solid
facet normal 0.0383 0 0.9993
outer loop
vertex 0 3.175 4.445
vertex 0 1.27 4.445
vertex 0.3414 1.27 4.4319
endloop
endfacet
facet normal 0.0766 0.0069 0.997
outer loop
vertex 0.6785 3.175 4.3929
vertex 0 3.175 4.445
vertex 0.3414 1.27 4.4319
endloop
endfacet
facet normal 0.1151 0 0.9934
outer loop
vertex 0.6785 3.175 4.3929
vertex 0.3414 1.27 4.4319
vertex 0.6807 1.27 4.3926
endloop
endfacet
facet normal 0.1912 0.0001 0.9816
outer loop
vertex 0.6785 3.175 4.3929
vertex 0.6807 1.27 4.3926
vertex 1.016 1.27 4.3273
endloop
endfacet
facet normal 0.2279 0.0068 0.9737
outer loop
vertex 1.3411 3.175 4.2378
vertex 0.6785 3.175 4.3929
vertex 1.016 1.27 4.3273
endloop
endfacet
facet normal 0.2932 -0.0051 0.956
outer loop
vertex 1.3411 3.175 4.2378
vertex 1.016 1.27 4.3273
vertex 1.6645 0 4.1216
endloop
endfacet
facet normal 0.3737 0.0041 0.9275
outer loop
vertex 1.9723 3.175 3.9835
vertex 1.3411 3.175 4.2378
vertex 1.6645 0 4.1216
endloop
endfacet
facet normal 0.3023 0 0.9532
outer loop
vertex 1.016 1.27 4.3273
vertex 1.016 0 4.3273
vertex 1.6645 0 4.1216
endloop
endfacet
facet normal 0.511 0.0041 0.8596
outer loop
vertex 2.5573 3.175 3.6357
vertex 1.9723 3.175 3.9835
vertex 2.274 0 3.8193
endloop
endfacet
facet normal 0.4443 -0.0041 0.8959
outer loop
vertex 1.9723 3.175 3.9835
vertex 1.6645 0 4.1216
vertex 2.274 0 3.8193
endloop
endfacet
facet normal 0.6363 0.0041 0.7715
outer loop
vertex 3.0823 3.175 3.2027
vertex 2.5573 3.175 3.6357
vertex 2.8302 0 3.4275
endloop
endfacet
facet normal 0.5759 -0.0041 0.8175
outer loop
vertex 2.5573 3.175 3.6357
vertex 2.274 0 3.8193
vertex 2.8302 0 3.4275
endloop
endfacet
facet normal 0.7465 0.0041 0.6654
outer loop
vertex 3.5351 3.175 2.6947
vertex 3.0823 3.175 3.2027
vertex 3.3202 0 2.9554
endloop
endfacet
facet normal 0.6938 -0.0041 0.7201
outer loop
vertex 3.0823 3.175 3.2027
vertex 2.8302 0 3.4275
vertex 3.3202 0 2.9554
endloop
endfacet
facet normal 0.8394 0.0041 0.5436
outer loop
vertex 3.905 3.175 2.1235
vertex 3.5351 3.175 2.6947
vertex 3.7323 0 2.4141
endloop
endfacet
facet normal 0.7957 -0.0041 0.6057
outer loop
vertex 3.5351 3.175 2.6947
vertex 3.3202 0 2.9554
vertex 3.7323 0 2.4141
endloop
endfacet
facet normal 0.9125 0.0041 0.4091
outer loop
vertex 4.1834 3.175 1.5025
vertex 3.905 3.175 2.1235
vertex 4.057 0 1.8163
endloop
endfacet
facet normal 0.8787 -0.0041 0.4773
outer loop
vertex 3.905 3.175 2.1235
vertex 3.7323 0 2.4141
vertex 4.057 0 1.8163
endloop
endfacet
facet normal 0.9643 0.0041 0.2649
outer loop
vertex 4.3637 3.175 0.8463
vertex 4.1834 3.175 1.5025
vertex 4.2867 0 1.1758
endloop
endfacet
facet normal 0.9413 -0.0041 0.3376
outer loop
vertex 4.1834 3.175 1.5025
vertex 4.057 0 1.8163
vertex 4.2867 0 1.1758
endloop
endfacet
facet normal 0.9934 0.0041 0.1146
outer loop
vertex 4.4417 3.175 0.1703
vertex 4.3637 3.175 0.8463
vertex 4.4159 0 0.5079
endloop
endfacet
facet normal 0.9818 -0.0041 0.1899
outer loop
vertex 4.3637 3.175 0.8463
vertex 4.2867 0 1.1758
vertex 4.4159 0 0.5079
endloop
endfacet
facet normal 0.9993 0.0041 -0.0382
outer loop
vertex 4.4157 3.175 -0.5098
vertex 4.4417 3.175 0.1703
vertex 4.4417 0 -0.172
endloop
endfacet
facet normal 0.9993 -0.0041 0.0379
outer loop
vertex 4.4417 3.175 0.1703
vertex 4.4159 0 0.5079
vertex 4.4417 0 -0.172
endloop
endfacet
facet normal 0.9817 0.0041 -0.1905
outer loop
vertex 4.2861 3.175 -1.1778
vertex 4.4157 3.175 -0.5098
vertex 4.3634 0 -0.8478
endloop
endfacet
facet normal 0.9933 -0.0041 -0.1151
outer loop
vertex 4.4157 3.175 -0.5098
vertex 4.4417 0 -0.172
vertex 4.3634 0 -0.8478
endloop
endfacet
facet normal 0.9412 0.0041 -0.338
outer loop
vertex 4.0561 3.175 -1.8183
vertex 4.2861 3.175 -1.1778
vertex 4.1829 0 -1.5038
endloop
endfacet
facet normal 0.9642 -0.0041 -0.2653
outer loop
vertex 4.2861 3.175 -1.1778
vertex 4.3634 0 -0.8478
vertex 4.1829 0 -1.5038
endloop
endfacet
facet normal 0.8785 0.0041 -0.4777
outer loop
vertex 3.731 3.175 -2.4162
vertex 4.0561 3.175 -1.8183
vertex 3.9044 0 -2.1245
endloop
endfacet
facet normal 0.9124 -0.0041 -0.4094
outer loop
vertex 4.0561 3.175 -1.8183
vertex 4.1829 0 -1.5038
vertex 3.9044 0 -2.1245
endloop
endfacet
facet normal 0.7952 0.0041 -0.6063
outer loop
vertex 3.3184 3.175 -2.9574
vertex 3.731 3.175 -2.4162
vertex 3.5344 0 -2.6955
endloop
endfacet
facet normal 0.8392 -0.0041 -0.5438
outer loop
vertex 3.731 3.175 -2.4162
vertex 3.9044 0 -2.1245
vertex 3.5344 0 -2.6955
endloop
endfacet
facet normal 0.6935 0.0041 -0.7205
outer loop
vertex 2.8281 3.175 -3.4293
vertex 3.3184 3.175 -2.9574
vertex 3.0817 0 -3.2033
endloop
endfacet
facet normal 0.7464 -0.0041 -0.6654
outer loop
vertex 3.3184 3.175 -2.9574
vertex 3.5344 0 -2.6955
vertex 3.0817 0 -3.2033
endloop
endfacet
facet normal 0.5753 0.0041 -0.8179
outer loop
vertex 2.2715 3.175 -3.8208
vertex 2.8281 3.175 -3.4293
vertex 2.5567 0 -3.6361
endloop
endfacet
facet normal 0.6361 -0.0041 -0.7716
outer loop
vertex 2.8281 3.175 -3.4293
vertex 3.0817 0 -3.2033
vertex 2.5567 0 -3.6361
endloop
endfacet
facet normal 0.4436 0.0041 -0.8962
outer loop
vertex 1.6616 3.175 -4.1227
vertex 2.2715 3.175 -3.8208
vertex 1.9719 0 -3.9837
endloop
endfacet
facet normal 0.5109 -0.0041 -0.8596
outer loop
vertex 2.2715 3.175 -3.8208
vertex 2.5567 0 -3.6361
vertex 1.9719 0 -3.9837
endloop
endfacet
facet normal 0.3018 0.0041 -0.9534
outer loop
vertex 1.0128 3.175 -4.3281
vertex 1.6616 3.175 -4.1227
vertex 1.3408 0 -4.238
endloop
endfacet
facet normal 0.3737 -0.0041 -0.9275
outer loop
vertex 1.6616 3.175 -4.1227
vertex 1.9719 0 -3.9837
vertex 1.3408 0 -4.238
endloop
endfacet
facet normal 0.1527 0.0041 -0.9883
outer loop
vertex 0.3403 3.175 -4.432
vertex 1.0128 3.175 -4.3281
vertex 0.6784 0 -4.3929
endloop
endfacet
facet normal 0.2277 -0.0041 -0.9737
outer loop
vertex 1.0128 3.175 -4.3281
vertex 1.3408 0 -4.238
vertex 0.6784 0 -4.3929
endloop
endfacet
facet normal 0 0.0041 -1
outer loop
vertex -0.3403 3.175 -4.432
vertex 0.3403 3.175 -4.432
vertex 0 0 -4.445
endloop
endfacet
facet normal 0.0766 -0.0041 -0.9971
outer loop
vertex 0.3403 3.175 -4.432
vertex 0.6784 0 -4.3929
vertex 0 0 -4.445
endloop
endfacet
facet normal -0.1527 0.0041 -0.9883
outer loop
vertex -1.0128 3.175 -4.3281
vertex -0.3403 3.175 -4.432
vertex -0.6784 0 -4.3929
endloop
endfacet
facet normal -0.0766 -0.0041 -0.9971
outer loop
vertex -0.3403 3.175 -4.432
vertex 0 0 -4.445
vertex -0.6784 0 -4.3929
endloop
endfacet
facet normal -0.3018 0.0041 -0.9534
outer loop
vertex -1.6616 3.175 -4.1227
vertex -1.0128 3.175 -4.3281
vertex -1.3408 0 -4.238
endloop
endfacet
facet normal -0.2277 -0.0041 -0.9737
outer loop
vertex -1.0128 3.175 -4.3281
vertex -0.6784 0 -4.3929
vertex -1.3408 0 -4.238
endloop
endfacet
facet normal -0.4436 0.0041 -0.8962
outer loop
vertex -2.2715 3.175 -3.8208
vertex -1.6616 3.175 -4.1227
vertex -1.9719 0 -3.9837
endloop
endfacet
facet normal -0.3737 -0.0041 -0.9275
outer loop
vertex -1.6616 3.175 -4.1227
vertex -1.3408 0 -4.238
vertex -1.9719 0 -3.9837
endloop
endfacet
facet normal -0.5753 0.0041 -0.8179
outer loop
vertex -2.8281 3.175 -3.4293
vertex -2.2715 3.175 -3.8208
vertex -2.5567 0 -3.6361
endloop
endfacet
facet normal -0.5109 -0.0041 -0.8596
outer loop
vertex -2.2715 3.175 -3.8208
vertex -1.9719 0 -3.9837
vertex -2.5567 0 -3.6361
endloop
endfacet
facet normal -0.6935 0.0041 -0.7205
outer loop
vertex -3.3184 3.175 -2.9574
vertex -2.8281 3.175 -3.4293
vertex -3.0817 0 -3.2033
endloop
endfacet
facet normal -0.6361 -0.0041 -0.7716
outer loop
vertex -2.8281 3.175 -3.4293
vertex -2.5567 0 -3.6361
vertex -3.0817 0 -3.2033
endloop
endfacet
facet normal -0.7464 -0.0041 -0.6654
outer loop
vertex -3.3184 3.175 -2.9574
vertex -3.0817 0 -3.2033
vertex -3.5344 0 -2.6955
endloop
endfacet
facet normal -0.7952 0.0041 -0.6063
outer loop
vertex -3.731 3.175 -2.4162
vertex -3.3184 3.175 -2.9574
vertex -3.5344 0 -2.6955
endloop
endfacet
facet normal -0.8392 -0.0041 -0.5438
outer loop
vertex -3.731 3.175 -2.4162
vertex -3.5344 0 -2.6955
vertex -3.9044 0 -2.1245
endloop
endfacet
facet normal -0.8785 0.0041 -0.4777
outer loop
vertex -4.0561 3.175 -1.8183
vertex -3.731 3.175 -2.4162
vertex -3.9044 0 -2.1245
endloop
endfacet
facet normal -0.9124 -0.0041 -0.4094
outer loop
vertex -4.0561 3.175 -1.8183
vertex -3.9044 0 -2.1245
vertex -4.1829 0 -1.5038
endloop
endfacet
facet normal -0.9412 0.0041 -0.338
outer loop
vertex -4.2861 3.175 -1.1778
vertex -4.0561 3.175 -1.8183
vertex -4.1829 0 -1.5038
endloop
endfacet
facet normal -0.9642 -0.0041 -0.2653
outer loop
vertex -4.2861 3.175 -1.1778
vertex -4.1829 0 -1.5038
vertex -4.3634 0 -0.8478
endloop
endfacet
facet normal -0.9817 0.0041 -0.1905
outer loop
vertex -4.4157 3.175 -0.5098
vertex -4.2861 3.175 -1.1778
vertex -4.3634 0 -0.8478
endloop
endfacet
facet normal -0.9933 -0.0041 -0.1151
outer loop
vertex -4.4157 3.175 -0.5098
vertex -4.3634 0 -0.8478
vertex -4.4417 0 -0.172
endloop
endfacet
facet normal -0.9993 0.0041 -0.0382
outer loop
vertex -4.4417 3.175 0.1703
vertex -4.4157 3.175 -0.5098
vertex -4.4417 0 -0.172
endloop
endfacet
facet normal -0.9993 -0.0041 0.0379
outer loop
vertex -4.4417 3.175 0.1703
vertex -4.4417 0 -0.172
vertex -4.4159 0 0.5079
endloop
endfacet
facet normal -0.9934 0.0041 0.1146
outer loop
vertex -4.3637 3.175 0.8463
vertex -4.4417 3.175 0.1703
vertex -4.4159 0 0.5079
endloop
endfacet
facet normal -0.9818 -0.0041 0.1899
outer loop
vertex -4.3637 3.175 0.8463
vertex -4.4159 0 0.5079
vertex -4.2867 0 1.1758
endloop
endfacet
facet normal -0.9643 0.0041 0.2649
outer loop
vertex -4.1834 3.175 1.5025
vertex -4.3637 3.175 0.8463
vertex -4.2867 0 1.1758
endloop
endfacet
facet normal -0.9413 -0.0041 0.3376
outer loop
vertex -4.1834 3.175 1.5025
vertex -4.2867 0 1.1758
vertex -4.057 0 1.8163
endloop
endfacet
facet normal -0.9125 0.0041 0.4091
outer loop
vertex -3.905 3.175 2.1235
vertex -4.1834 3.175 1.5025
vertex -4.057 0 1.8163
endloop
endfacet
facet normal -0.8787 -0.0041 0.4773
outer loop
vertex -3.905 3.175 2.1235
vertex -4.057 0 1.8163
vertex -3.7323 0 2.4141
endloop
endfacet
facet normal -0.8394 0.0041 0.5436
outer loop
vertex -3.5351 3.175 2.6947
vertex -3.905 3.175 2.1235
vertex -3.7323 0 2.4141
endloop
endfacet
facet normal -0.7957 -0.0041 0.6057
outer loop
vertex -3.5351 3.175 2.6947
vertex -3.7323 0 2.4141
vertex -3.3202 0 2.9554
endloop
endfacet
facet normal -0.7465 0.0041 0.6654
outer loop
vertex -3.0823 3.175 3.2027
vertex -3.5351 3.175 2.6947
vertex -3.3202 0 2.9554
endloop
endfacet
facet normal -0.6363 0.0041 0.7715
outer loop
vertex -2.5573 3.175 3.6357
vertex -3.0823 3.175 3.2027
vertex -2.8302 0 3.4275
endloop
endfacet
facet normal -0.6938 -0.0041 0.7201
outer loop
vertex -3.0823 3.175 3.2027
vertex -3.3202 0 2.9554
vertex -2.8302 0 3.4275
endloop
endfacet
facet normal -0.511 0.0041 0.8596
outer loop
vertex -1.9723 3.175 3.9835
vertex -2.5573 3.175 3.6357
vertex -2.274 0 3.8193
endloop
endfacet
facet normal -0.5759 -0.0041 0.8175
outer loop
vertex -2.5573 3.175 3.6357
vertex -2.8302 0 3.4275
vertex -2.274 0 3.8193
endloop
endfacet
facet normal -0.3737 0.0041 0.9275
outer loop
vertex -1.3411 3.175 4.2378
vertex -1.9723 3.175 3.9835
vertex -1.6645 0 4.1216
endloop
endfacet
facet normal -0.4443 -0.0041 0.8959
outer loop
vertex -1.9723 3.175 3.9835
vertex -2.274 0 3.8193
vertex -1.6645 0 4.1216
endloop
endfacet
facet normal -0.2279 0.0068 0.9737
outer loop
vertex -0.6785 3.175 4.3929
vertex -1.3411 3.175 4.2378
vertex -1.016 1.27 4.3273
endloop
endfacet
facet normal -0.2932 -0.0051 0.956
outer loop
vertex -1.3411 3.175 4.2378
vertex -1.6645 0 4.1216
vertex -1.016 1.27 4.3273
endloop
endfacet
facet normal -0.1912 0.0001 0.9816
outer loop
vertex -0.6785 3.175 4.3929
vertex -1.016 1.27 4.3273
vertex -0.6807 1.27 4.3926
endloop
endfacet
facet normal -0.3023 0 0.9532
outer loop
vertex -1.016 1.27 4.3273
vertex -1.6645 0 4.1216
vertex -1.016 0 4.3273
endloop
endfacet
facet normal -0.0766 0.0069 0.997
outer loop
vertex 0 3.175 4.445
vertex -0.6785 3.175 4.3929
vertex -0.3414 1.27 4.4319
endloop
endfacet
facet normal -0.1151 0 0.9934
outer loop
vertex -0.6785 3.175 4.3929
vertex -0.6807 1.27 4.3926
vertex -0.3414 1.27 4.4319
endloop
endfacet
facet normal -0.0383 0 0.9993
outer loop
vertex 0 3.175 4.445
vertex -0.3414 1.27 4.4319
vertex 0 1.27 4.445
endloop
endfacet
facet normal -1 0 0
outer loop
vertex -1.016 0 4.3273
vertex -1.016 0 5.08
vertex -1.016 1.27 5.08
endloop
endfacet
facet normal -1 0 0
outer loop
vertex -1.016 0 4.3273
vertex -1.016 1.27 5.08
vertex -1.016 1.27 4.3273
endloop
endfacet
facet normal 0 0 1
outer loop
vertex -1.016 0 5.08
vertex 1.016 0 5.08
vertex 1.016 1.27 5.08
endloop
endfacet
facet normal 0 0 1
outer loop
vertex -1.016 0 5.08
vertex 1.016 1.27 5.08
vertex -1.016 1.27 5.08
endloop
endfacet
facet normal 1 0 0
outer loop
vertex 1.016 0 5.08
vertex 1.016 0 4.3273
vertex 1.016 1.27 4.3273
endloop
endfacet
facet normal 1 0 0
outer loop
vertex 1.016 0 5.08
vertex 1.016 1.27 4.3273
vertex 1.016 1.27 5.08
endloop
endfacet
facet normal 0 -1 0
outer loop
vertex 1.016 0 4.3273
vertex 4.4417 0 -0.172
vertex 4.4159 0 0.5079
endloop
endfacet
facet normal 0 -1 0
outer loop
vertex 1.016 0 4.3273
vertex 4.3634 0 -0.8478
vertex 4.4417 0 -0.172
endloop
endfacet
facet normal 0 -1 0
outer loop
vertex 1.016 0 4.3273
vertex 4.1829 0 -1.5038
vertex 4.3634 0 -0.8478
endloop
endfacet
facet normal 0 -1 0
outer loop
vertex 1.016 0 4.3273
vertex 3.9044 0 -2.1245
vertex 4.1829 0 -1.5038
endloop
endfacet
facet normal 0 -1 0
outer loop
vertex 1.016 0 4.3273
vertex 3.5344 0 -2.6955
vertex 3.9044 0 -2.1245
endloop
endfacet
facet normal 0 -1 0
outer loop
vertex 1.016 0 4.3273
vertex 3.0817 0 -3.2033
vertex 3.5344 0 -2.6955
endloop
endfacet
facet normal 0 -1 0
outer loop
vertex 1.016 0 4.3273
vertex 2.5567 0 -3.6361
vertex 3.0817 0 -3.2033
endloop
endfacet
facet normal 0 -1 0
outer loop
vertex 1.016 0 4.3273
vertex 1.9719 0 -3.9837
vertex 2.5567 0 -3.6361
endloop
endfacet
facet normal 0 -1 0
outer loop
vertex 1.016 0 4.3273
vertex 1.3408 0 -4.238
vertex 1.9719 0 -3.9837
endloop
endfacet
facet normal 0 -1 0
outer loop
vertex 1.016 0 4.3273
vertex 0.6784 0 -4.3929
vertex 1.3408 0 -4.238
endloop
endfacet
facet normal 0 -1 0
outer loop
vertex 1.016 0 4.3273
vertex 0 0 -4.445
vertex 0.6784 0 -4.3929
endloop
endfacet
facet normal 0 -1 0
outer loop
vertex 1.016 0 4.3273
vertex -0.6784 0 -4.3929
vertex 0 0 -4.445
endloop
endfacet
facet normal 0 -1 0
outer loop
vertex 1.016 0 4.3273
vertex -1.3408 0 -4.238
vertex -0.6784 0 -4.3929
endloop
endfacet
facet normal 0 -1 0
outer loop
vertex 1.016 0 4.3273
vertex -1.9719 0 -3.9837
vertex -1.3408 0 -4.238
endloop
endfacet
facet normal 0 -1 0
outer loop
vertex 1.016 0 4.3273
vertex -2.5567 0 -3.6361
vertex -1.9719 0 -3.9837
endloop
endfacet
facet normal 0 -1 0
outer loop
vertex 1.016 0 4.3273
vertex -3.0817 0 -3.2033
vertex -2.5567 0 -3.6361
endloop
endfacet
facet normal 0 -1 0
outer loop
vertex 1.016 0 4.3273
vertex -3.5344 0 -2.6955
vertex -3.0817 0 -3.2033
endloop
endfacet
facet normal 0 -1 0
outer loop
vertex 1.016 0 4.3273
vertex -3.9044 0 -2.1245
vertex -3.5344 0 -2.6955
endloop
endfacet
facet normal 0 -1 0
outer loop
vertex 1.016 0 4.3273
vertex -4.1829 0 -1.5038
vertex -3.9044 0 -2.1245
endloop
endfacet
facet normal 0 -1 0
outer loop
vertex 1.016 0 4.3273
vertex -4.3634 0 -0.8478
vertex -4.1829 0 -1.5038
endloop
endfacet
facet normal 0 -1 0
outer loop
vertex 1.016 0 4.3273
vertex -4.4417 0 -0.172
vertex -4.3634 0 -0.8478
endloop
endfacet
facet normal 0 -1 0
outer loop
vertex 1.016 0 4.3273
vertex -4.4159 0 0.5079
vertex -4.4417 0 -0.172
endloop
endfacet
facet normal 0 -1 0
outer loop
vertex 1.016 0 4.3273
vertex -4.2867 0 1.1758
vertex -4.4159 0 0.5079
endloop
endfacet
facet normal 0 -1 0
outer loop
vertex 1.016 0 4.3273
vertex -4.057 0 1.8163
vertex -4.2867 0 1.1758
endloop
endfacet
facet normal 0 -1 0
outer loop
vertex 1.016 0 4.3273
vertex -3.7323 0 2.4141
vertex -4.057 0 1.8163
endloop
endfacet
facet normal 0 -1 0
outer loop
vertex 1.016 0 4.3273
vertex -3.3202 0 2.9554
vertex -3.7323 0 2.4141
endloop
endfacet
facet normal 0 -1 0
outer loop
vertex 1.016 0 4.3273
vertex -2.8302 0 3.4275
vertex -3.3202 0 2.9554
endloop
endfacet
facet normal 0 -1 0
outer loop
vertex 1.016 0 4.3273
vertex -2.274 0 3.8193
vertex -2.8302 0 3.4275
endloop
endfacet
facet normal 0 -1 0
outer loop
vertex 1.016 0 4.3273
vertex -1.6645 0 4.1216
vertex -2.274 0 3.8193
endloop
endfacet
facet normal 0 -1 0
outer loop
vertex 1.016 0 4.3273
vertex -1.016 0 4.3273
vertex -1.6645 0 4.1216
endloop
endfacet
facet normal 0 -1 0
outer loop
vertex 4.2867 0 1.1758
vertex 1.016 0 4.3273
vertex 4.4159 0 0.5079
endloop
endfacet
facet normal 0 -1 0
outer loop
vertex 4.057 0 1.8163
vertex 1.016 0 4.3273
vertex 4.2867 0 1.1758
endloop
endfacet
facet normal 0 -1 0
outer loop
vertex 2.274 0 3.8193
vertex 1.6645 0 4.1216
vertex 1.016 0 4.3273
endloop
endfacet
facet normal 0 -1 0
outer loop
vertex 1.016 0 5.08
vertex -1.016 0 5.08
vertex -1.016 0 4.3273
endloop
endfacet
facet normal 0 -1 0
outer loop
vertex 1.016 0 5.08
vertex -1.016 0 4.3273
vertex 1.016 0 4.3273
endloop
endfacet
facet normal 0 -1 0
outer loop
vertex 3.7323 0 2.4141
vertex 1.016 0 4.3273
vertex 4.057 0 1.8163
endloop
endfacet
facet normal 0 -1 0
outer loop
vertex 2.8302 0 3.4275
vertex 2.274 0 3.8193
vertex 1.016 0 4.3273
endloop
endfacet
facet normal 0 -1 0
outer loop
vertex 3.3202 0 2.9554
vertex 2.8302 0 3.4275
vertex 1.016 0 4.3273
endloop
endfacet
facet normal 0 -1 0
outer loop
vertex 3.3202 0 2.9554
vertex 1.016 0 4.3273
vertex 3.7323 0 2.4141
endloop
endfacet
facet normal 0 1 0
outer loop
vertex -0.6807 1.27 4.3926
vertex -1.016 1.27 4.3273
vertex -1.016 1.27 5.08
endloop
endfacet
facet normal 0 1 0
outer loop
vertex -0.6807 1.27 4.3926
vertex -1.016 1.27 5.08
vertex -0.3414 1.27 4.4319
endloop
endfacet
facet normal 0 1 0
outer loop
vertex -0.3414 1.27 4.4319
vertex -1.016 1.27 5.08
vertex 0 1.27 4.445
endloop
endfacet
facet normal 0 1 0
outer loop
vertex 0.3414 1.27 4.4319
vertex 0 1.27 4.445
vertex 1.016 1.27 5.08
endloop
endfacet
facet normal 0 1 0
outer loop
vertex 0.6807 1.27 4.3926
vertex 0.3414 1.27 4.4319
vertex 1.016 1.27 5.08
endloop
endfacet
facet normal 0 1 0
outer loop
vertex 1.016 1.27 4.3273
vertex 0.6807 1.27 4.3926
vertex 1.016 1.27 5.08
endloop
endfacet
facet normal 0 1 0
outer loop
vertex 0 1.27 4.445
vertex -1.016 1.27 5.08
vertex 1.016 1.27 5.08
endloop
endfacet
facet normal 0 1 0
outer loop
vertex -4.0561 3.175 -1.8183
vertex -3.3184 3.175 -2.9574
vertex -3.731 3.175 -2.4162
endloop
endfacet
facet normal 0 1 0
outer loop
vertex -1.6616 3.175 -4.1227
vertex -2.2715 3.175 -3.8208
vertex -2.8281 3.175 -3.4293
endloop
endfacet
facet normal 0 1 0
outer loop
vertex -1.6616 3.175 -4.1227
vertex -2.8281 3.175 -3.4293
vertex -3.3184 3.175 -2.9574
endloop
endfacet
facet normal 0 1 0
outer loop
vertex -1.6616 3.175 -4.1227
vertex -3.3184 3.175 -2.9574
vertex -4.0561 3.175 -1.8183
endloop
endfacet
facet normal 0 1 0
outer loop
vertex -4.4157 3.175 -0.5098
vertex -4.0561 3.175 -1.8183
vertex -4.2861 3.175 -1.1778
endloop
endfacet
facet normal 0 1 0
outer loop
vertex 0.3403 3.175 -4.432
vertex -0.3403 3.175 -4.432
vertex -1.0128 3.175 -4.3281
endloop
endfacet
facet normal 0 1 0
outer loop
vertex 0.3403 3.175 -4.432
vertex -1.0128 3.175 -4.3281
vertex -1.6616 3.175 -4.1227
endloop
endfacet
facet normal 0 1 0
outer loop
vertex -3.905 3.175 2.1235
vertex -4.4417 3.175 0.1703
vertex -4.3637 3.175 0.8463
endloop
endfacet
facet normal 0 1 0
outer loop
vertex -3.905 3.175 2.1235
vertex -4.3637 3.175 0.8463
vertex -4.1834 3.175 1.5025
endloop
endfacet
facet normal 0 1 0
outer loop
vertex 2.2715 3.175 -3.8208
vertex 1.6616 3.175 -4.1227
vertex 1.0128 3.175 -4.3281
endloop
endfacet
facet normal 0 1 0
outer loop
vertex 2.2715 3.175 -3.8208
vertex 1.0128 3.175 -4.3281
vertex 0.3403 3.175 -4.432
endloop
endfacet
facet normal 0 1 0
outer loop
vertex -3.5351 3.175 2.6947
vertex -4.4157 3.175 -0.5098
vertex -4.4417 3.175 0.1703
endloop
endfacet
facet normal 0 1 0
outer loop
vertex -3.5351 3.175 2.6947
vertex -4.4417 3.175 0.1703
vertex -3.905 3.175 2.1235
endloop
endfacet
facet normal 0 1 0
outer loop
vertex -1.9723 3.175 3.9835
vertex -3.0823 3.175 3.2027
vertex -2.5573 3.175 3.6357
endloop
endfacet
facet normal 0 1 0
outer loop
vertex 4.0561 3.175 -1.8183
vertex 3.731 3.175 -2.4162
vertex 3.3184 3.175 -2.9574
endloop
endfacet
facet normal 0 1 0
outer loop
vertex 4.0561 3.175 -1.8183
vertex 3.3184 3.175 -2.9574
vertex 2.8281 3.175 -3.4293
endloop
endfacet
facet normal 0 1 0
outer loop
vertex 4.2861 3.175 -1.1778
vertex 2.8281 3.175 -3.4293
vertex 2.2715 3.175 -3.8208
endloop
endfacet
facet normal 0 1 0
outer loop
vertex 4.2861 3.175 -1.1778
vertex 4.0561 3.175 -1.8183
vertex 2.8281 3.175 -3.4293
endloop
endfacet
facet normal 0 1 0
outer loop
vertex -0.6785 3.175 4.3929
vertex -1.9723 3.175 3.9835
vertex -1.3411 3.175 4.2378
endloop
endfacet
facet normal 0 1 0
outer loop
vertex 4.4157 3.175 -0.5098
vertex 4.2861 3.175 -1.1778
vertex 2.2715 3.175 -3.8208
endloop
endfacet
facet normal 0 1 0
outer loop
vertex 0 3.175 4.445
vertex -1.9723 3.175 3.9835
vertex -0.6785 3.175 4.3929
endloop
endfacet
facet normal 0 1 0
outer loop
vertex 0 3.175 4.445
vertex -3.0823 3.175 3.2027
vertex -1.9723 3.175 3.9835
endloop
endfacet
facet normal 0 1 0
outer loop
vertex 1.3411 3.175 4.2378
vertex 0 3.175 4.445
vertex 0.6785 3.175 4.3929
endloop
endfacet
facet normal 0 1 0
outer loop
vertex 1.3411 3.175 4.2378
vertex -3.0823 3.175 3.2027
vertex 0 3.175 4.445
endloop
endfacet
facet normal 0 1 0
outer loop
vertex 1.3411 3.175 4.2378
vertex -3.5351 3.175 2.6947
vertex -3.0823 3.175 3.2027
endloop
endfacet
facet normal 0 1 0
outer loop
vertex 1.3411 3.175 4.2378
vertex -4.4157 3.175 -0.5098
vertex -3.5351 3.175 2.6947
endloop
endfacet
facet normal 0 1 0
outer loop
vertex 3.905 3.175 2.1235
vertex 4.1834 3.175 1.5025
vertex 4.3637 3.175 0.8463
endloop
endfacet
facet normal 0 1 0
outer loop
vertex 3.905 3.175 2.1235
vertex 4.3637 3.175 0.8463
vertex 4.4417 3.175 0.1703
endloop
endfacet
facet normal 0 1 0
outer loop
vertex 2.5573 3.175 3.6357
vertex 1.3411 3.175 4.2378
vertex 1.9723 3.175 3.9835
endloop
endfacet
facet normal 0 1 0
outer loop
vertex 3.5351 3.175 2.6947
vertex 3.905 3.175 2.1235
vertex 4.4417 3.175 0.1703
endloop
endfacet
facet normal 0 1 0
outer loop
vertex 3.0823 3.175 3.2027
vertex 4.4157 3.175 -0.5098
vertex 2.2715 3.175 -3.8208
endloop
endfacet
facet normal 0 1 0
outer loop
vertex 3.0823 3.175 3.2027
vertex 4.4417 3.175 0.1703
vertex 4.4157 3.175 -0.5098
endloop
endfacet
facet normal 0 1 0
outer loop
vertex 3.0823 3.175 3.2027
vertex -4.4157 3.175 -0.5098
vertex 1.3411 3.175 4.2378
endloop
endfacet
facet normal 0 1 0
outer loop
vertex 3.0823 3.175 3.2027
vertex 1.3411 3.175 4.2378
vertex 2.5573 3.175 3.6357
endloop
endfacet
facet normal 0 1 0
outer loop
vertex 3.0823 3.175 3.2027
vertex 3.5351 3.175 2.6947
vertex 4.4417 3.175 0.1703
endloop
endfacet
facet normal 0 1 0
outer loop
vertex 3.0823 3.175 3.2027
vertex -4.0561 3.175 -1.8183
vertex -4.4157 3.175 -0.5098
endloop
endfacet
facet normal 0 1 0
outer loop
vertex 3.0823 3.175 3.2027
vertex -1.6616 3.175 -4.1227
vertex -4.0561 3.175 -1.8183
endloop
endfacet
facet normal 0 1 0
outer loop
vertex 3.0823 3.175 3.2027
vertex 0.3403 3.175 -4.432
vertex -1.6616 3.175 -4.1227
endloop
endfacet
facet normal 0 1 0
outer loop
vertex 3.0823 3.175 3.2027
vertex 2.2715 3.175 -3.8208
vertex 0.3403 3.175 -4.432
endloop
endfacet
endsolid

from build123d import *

# Parameters (mm, degrees)
SKETCH1_R           = 4.445
BOSS_EXTRUDE1_DEPTH = 3.175
BOSS_EXTRUDE2_DEPTH = 1.27


with BuildPart() as part:
    # Sketch1 → Boss-Extrude1 (new body)
    with BuildSketch(Plane(origin=(0, 0, 0), x_dir=(1, 0, 0), z_dir=(0, 1, 0))):
        with Locations(Location((0, 0, 0), (0, 0, 270))):
            Circle(SKETCH1_R)
    extrude(amount=BOSS_EXTRUDE1_DEPTH)

    # Sketch3 → Boss-Extrude2 (add)
    with BuildSketch(Plane.XZ):
        with BuildLine():
            Line((0, 4.445), (0, 5.08))
            Line((0, 5.08), (-1.016, 5.08))
            Line((-1.016, 5.08), (-1.016, 4.327328159))
            ThreePointArc((-1.016, 4.327328159), (-0.511395801, 4.415484043), (0, 4.445))
        make_face()
        with BuildLine():
            Line((1.016, 4.327328159), (1.016, 5.08))
            Line((1.016, 5.08), (0, 5.08))
            Line((0, 5.08), (0, 4.445))
            ThreePointArc((0, 4.445), (0.511395801, 4.415484043), (1.016, 4.327328159))
        make_face()
    extrude(amount=-BOSS_EXTRUDE2_DEPTH)


solid = part.part
